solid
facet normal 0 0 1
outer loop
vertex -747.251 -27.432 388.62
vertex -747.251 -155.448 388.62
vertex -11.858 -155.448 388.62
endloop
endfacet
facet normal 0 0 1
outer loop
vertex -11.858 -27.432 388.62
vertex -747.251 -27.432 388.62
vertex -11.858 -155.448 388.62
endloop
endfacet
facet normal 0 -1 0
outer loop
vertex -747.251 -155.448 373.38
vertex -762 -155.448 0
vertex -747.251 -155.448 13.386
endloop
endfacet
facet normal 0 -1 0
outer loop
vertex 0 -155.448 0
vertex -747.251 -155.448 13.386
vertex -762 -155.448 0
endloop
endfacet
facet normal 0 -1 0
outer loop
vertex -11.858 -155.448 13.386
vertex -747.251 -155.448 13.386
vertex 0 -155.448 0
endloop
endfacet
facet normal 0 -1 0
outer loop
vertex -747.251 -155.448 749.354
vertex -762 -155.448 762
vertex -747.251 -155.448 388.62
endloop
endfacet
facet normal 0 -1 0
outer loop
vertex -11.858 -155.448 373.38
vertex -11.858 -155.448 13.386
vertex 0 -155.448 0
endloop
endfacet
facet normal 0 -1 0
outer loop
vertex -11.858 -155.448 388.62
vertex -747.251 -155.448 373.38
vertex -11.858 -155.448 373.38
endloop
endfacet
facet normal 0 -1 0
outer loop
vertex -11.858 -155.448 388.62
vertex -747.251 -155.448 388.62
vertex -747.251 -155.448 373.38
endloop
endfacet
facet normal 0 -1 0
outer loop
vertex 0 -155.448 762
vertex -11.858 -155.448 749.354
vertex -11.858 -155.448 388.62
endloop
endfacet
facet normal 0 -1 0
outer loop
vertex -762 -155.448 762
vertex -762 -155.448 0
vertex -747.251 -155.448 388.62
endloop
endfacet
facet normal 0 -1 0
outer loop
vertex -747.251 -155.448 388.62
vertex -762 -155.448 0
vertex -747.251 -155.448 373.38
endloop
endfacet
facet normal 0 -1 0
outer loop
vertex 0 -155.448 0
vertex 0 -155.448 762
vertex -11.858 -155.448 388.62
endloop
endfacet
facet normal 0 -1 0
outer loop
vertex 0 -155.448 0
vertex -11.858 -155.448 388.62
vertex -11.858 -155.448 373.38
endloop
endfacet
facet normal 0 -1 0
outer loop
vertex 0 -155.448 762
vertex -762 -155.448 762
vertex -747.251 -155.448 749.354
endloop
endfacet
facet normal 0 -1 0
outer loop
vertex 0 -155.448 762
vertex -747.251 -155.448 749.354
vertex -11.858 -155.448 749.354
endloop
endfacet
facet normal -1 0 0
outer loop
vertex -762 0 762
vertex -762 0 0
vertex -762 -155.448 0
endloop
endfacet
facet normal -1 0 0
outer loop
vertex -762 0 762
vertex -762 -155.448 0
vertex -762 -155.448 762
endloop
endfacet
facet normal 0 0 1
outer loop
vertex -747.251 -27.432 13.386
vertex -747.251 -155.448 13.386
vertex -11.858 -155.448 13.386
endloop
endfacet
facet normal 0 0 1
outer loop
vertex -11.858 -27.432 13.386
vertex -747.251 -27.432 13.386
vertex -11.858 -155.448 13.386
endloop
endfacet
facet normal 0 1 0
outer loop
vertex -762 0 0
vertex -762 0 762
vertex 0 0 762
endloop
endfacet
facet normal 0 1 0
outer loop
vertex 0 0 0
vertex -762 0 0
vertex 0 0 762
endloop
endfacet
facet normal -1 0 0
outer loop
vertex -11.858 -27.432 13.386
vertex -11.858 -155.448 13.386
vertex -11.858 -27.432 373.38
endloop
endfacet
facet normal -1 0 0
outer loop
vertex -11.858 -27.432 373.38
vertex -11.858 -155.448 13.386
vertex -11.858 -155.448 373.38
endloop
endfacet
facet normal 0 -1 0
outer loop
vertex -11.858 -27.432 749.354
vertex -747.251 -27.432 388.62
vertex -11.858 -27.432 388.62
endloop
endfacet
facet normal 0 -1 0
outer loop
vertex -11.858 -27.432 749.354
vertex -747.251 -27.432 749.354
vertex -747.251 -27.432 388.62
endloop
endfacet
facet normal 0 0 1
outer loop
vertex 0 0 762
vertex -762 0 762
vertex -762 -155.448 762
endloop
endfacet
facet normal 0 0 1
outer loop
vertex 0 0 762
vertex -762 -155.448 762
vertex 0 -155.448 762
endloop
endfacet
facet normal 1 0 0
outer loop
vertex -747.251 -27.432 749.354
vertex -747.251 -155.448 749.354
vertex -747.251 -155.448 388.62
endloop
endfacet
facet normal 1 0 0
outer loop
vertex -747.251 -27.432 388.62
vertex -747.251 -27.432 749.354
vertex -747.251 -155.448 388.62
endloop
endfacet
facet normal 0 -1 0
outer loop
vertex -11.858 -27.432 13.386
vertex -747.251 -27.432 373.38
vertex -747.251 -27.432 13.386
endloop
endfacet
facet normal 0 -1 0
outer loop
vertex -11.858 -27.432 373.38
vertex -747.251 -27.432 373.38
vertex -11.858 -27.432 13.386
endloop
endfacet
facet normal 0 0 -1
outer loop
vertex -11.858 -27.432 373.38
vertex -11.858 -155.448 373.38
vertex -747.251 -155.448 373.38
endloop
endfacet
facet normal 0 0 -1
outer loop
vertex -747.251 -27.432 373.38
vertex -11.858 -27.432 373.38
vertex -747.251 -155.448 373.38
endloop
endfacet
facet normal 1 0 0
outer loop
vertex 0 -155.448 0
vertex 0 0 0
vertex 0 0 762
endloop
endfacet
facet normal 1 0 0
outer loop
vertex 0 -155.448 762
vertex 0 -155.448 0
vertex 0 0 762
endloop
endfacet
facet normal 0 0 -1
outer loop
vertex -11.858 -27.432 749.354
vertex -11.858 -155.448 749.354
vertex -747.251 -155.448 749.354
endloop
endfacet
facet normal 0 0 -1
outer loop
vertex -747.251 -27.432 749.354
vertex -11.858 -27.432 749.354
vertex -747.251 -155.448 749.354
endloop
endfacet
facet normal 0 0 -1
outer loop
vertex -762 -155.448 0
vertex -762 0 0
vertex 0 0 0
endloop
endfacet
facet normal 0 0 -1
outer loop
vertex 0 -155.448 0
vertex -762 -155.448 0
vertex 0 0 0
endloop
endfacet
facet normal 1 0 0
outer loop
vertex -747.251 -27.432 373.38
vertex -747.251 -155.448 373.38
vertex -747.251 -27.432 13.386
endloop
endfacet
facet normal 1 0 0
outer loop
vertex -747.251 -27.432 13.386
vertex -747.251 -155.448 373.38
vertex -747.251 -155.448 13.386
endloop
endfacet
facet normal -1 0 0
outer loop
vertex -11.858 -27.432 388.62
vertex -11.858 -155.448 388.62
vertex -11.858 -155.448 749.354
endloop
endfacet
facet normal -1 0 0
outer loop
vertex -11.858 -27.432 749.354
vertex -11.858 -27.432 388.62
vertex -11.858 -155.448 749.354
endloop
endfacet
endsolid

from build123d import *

# Parameters (mm, degrees)
F0_W     = 762
F0_H     = 762
F1_DEPTH = 155.448
F3_DEPTH = 128.016


with BuildPart() as f1:
    # F0 (on Front) → F1 (new body)
    with BuildSketch(Plane.XZ):
        with Locations((-381, 381)):
            Rectangle(F0_W, F0_H)
    extrude(amount=F1_DEPTH)

    # F2 (on face) → F3 (cut)
    with BuildSketch(Plane.XZ.offset(155.448)):
        Polygon((-747.250676, 388.62), (-381, 388.62), (-11.85805, 388.62), (-11.85805, 749.354362), (-747.250676, 749.354362), align=None)
        Polygon((-381, 373.38), (-747.250676, 373.38), (-747.250676, 13.386413), (-11.85805, 13.386413), (-11.85805, 373.38), align=None)
    extrude(amount=-F3_DEPTH, mode=Mode.SUBTRACT)


solid = f1.part
